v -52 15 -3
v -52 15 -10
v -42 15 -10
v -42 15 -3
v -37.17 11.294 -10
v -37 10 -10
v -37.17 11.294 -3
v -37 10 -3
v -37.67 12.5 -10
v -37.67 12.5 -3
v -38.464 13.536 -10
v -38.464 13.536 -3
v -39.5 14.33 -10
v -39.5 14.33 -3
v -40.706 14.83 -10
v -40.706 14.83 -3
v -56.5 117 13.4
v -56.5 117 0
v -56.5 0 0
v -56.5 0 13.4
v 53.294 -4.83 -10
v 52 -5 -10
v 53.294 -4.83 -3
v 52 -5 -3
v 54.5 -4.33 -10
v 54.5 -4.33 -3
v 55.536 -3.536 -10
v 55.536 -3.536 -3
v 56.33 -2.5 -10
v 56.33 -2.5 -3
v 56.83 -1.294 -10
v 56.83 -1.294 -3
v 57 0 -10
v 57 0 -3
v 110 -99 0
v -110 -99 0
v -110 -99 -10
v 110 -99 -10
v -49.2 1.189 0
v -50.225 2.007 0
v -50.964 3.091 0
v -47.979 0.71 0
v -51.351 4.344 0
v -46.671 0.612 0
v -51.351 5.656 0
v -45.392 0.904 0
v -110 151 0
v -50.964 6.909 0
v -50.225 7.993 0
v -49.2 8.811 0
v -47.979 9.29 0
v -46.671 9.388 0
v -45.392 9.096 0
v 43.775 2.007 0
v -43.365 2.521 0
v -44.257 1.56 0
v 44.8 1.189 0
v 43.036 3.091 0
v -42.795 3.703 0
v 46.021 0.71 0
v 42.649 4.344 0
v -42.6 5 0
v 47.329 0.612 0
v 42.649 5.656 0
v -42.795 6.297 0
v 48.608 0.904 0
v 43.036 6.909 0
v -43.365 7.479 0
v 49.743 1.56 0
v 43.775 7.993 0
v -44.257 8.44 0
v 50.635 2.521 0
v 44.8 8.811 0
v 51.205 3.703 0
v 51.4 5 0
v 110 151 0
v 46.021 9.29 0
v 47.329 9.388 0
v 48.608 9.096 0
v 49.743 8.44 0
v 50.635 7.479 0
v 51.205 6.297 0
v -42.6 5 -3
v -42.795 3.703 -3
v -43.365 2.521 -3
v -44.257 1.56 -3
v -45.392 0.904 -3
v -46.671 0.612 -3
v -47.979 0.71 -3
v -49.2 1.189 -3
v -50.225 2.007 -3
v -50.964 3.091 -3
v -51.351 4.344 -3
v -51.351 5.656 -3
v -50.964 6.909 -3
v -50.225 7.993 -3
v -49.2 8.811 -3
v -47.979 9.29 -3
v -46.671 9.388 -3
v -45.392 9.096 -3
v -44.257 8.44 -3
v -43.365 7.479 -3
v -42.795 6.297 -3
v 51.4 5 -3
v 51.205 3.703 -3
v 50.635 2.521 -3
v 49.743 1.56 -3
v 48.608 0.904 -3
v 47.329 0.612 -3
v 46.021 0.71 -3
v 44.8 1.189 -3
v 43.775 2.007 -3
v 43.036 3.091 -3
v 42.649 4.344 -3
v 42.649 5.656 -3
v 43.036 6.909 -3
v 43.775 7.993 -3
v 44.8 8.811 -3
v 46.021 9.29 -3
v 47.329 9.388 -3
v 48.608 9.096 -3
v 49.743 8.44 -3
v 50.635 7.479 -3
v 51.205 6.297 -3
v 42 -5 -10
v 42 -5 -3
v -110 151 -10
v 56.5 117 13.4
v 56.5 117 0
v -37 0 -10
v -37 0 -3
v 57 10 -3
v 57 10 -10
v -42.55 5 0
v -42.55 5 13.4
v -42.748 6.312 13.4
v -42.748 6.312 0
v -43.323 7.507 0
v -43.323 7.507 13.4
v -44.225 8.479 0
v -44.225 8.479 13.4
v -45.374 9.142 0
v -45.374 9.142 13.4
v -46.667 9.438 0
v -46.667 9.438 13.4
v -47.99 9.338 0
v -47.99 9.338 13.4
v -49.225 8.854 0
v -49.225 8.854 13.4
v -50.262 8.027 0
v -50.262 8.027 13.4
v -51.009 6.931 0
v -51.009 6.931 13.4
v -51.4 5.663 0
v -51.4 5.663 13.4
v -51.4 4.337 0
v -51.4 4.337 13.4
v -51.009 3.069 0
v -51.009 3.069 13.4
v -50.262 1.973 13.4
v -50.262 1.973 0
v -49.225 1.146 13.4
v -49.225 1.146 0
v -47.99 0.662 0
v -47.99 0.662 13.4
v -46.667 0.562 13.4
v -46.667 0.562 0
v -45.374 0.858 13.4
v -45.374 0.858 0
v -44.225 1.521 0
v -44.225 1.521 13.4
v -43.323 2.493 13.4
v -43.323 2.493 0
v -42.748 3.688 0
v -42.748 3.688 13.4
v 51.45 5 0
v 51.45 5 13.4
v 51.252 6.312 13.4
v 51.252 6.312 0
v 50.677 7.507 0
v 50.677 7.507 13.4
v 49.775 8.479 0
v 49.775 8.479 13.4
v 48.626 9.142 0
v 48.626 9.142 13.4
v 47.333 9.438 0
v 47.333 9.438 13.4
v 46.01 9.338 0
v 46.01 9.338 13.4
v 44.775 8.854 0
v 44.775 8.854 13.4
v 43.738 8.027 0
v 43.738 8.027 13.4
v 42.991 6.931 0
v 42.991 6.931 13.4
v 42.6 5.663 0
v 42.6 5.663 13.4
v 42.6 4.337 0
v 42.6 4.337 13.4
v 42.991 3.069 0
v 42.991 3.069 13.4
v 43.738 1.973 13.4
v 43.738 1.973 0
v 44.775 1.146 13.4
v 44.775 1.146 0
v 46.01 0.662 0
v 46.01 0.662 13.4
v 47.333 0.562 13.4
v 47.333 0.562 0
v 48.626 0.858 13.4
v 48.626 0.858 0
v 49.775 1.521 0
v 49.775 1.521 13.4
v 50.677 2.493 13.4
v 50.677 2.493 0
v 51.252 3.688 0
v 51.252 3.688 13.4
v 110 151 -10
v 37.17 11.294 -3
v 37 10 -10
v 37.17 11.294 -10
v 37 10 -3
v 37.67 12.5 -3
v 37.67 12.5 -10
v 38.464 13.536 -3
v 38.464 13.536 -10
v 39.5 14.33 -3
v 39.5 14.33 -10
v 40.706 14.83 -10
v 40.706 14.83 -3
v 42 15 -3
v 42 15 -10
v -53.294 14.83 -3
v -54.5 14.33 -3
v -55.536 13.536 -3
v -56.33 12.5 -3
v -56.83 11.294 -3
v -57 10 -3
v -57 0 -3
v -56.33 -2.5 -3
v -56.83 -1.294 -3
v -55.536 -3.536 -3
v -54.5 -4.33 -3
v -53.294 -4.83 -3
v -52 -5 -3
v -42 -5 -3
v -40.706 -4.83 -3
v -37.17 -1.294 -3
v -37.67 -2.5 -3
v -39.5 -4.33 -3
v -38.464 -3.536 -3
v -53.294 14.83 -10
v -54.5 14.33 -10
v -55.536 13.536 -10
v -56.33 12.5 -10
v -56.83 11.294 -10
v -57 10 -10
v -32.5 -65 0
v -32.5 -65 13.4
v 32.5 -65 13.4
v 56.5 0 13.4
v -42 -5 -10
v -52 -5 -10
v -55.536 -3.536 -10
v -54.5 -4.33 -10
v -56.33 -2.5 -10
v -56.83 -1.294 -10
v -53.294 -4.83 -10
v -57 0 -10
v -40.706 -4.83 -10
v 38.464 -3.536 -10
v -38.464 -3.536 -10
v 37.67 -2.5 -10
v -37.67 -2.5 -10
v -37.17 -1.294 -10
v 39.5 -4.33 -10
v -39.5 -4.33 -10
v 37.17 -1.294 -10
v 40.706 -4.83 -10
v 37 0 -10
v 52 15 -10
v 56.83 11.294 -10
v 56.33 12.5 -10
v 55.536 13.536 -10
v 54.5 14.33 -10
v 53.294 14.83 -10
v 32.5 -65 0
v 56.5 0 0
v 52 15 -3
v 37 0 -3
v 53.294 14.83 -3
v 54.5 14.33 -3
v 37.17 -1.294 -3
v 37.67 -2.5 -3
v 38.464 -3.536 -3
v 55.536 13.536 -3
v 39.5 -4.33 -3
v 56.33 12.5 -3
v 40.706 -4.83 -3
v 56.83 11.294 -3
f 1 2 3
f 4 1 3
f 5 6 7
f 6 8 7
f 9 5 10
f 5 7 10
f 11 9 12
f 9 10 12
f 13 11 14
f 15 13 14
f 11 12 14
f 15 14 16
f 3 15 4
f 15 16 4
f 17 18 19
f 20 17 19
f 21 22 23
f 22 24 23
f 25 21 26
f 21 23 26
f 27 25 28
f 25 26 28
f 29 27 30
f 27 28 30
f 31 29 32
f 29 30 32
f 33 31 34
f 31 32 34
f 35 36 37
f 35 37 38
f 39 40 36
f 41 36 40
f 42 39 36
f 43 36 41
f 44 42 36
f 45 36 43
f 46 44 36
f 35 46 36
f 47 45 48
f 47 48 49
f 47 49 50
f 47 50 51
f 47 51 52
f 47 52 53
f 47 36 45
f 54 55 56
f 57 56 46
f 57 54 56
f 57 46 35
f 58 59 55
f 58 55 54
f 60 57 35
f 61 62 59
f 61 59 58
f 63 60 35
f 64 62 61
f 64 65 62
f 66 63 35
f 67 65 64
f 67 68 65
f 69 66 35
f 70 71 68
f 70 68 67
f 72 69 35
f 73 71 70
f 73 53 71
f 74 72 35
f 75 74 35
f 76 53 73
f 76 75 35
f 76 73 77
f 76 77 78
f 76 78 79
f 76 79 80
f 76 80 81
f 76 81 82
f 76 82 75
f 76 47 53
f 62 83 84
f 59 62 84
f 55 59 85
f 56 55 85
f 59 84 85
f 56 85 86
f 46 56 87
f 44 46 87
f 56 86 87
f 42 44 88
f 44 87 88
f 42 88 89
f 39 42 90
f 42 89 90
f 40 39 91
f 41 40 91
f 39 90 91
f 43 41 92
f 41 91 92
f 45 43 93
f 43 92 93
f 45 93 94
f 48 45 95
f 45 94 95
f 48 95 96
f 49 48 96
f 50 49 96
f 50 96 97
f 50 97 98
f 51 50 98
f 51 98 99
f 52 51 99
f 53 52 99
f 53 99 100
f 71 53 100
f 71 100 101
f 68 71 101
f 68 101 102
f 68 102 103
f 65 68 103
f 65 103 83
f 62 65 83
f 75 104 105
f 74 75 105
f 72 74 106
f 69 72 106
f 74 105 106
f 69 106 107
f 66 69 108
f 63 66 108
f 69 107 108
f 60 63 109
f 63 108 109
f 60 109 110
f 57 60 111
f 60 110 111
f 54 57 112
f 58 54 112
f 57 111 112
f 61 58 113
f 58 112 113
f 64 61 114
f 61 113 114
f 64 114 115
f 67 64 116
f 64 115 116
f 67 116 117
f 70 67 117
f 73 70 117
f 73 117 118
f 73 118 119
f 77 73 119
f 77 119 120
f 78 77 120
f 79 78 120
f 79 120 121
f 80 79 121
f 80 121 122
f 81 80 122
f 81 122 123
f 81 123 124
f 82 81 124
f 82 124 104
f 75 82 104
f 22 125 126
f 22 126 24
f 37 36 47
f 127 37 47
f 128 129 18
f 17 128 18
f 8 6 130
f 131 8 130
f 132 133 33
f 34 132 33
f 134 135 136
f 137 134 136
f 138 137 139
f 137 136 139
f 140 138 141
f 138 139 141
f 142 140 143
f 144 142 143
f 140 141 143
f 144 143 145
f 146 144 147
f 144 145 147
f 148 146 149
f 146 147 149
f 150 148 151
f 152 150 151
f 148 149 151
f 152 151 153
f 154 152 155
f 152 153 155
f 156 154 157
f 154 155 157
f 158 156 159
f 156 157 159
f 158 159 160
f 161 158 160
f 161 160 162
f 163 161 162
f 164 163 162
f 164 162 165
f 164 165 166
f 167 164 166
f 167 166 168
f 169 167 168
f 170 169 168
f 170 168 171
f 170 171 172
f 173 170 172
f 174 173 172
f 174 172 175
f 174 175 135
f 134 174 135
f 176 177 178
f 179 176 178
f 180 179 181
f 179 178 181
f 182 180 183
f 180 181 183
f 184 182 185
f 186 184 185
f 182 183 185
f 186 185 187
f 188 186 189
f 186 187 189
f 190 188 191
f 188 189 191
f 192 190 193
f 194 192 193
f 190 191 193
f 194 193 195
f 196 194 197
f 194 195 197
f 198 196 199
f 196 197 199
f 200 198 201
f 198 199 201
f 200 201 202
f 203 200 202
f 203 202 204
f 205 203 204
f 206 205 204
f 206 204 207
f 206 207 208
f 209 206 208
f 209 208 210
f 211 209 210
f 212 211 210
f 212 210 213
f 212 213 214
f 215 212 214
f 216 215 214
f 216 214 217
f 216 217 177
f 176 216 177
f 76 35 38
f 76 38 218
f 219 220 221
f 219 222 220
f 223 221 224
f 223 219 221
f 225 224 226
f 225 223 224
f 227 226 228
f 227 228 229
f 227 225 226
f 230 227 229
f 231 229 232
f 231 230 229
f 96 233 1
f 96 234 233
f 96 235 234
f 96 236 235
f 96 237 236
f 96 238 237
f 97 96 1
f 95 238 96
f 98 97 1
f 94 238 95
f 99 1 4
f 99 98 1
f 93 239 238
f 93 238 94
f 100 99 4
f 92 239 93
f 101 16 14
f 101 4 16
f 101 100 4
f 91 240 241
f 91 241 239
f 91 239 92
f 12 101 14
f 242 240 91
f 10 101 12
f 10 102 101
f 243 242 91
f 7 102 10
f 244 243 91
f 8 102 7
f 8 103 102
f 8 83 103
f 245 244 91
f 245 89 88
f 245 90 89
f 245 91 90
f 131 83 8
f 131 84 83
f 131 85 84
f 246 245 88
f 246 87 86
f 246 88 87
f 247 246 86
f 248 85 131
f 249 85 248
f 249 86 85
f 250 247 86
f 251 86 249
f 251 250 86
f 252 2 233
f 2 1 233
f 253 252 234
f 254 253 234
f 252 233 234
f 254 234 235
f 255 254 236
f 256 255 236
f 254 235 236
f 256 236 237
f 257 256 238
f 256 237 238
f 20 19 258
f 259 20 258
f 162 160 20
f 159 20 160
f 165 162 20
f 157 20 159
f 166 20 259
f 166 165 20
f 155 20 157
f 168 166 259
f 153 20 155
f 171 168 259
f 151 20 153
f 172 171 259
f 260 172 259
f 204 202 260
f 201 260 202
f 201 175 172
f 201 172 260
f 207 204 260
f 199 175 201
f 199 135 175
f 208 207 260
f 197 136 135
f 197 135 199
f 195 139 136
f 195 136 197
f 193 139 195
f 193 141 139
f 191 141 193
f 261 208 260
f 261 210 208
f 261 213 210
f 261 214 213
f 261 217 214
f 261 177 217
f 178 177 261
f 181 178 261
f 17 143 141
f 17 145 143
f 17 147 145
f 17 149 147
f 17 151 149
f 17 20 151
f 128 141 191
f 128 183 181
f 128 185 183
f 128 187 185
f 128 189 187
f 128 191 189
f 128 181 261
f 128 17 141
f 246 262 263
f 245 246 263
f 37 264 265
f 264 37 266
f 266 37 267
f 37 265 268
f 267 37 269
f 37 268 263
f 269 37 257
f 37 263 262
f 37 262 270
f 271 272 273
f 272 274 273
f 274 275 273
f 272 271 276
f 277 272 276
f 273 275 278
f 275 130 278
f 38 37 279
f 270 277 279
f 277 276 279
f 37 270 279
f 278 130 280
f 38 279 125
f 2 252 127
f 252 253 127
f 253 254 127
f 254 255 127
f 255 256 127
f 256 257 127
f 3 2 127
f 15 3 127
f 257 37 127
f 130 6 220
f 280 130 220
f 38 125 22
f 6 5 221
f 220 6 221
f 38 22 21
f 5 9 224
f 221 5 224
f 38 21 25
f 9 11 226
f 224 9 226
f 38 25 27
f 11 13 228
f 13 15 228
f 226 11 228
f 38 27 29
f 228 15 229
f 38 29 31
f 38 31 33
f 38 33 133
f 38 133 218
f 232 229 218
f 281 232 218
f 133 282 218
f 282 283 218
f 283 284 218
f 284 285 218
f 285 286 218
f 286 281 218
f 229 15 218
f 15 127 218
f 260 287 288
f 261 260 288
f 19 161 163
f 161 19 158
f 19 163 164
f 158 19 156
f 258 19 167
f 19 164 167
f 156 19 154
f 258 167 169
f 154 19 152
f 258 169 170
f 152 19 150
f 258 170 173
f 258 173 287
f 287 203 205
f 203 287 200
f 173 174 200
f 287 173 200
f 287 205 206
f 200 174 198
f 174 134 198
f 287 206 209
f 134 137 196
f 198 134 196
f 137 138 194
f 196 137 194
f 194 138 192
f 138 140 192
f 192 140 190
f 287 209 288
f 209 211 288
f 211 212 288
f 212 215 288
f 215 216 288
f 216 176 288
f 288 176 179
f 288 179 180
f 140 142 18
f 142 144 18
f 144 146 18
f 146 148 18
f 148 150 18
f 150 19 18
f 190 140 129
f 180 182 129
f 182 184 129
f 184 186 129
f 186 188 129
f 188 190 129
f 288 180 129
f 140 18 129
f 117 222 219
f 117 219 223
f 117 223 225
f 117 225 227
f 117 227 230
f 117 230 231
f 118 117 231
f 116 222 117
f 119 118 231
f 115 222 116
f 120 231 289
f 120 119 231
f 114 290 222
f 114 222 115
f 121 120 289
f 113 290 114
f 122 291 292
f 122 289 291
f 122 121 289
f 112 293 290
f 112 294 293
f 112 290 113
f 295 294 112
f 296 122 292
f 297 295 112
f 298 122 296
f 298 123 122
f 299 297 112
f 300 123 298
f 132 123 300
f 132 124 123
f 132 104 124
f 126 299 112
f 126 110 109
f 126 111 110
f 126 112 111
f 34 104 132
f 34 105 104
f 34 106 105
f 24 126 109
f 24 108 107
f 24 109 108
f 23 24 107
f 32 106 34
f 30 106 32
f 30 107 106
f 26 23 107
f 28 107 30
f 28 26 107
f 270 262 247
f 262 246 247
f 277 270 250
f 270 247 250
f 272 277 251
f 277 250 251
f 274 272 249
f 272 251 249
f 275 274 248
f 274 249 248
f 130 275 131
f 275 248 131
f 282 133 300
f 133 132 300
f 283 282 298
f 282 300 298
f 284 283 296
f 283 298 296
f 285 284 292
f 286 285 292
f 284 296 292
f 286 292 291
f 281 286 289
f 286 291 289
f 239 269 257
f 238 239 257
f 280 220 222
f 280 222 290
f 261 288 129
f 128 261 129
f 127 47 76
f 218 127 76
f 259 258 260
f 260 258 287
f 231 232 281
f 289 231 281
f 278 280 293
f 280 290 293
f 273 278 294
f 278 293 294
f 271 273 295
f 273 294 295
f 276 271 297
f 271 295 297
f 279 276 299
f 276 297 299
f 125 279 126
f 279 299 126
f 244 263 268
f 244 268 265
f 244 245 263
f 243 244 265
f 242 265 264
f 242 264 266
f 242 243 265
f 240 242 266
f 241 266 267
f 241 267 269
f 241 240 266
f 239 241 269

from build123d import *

# Parameters (mm, degrees)
F1_DEPTH  = 13.4
F2_R      = 4.45
F3_DEPTH  = 13.401
F4_W      = 220
F4_H      = 250
F5_DEPTH  = 10
F6_R      = 4.4
F7_DEPTH  = 10
F9_W      = 10
F9_H      = 10
F9_W_2    = 20
F9_H_2    = 20
F10_DEPTH = 7
F11_R     = 5


with BuildPart() as f1:
    # F0 (on Top) → F1 (new body)
    with BuildSketch(Plane.XY):
        Polygon((-56.5, 117), (-56.5, 0), (-32.5, -65), (0, -65), (0, 0), (0, 117), align=None)
        Polygon((56.5, 117), (0, 117), (0, 0), (0, -65), (32.5, -65), (56.5, 0), align=None)
    extrude(amount=F1_DEPTH)

    # F2 (on face) → F3 (cut, through all)
    with BuildSketch(Plane.XY.offset(13.4)):
        with Locations((-47, 5)):
            Circle(F2_R)
        with Locations((47, 5)):
            Circle(F2_R)
    extrude(amount=-F3_DEPTH, mode=Mode.SUBTRACT)


with BuildPart() as f5:
    # F4 (on Top) → F5 (new body)
    with BuildSketch(Plane.XY):
        with Locations((0, 26)):
            Rectangle(F4_W, F4_H)
    extrude(amount=-F5_DEPTH)

    # F6 (on face) → F7 (cut, through all)
    with BuildSketch(Plane(origin=(0, 0, -10), x_dir=(1, 0, 0), z_dir=(0, 0, -1))):
        with Locations((-47, -5)):
            Circle(F6_R)
        with Locations((47, -5)):
            Circle(F6_R)
    extrude(amount=-F7_DEPTH, mode=Mode.SUBTRACT)

    # F9 (on face) → F10 (cut)
    with BuildSketch(Plane(origin=(0, 0, -10), x_dir=(1, 0, 0), z_dir=(0, 0, -1))):
        Polygon((-47, 5), (-57, 5), (-57, -15), (-37, -15), (-37, -5), (-47, -5), align=None)
        with Locations((-42, 0)):
            Rectangle(F9_W, F9_H)
        with Locations((47, -5)):
            Rectangle(F9_W_2, F9_H_2)
    extrude(amount=-F10_DEPTH, mode=Mode.SUBTRACT)

    # F11
    f11_edges = [f5.edges().sort_by_distance(p)[0] for p in [
        (-57, -5, -6.5),
        (-37, -5, -6.5),
        (-37, 15, -6.5),
        (-57, 15, -6.5),
        (57, -5, -6.5),
        (57, 15, -6.5),
        (37, 15, -6.5),
        (37, -5, -6.5),
    ]]
    fillet(f11_edges, radius=F11_R)


solid = Compound([f1.part, f5.part])
